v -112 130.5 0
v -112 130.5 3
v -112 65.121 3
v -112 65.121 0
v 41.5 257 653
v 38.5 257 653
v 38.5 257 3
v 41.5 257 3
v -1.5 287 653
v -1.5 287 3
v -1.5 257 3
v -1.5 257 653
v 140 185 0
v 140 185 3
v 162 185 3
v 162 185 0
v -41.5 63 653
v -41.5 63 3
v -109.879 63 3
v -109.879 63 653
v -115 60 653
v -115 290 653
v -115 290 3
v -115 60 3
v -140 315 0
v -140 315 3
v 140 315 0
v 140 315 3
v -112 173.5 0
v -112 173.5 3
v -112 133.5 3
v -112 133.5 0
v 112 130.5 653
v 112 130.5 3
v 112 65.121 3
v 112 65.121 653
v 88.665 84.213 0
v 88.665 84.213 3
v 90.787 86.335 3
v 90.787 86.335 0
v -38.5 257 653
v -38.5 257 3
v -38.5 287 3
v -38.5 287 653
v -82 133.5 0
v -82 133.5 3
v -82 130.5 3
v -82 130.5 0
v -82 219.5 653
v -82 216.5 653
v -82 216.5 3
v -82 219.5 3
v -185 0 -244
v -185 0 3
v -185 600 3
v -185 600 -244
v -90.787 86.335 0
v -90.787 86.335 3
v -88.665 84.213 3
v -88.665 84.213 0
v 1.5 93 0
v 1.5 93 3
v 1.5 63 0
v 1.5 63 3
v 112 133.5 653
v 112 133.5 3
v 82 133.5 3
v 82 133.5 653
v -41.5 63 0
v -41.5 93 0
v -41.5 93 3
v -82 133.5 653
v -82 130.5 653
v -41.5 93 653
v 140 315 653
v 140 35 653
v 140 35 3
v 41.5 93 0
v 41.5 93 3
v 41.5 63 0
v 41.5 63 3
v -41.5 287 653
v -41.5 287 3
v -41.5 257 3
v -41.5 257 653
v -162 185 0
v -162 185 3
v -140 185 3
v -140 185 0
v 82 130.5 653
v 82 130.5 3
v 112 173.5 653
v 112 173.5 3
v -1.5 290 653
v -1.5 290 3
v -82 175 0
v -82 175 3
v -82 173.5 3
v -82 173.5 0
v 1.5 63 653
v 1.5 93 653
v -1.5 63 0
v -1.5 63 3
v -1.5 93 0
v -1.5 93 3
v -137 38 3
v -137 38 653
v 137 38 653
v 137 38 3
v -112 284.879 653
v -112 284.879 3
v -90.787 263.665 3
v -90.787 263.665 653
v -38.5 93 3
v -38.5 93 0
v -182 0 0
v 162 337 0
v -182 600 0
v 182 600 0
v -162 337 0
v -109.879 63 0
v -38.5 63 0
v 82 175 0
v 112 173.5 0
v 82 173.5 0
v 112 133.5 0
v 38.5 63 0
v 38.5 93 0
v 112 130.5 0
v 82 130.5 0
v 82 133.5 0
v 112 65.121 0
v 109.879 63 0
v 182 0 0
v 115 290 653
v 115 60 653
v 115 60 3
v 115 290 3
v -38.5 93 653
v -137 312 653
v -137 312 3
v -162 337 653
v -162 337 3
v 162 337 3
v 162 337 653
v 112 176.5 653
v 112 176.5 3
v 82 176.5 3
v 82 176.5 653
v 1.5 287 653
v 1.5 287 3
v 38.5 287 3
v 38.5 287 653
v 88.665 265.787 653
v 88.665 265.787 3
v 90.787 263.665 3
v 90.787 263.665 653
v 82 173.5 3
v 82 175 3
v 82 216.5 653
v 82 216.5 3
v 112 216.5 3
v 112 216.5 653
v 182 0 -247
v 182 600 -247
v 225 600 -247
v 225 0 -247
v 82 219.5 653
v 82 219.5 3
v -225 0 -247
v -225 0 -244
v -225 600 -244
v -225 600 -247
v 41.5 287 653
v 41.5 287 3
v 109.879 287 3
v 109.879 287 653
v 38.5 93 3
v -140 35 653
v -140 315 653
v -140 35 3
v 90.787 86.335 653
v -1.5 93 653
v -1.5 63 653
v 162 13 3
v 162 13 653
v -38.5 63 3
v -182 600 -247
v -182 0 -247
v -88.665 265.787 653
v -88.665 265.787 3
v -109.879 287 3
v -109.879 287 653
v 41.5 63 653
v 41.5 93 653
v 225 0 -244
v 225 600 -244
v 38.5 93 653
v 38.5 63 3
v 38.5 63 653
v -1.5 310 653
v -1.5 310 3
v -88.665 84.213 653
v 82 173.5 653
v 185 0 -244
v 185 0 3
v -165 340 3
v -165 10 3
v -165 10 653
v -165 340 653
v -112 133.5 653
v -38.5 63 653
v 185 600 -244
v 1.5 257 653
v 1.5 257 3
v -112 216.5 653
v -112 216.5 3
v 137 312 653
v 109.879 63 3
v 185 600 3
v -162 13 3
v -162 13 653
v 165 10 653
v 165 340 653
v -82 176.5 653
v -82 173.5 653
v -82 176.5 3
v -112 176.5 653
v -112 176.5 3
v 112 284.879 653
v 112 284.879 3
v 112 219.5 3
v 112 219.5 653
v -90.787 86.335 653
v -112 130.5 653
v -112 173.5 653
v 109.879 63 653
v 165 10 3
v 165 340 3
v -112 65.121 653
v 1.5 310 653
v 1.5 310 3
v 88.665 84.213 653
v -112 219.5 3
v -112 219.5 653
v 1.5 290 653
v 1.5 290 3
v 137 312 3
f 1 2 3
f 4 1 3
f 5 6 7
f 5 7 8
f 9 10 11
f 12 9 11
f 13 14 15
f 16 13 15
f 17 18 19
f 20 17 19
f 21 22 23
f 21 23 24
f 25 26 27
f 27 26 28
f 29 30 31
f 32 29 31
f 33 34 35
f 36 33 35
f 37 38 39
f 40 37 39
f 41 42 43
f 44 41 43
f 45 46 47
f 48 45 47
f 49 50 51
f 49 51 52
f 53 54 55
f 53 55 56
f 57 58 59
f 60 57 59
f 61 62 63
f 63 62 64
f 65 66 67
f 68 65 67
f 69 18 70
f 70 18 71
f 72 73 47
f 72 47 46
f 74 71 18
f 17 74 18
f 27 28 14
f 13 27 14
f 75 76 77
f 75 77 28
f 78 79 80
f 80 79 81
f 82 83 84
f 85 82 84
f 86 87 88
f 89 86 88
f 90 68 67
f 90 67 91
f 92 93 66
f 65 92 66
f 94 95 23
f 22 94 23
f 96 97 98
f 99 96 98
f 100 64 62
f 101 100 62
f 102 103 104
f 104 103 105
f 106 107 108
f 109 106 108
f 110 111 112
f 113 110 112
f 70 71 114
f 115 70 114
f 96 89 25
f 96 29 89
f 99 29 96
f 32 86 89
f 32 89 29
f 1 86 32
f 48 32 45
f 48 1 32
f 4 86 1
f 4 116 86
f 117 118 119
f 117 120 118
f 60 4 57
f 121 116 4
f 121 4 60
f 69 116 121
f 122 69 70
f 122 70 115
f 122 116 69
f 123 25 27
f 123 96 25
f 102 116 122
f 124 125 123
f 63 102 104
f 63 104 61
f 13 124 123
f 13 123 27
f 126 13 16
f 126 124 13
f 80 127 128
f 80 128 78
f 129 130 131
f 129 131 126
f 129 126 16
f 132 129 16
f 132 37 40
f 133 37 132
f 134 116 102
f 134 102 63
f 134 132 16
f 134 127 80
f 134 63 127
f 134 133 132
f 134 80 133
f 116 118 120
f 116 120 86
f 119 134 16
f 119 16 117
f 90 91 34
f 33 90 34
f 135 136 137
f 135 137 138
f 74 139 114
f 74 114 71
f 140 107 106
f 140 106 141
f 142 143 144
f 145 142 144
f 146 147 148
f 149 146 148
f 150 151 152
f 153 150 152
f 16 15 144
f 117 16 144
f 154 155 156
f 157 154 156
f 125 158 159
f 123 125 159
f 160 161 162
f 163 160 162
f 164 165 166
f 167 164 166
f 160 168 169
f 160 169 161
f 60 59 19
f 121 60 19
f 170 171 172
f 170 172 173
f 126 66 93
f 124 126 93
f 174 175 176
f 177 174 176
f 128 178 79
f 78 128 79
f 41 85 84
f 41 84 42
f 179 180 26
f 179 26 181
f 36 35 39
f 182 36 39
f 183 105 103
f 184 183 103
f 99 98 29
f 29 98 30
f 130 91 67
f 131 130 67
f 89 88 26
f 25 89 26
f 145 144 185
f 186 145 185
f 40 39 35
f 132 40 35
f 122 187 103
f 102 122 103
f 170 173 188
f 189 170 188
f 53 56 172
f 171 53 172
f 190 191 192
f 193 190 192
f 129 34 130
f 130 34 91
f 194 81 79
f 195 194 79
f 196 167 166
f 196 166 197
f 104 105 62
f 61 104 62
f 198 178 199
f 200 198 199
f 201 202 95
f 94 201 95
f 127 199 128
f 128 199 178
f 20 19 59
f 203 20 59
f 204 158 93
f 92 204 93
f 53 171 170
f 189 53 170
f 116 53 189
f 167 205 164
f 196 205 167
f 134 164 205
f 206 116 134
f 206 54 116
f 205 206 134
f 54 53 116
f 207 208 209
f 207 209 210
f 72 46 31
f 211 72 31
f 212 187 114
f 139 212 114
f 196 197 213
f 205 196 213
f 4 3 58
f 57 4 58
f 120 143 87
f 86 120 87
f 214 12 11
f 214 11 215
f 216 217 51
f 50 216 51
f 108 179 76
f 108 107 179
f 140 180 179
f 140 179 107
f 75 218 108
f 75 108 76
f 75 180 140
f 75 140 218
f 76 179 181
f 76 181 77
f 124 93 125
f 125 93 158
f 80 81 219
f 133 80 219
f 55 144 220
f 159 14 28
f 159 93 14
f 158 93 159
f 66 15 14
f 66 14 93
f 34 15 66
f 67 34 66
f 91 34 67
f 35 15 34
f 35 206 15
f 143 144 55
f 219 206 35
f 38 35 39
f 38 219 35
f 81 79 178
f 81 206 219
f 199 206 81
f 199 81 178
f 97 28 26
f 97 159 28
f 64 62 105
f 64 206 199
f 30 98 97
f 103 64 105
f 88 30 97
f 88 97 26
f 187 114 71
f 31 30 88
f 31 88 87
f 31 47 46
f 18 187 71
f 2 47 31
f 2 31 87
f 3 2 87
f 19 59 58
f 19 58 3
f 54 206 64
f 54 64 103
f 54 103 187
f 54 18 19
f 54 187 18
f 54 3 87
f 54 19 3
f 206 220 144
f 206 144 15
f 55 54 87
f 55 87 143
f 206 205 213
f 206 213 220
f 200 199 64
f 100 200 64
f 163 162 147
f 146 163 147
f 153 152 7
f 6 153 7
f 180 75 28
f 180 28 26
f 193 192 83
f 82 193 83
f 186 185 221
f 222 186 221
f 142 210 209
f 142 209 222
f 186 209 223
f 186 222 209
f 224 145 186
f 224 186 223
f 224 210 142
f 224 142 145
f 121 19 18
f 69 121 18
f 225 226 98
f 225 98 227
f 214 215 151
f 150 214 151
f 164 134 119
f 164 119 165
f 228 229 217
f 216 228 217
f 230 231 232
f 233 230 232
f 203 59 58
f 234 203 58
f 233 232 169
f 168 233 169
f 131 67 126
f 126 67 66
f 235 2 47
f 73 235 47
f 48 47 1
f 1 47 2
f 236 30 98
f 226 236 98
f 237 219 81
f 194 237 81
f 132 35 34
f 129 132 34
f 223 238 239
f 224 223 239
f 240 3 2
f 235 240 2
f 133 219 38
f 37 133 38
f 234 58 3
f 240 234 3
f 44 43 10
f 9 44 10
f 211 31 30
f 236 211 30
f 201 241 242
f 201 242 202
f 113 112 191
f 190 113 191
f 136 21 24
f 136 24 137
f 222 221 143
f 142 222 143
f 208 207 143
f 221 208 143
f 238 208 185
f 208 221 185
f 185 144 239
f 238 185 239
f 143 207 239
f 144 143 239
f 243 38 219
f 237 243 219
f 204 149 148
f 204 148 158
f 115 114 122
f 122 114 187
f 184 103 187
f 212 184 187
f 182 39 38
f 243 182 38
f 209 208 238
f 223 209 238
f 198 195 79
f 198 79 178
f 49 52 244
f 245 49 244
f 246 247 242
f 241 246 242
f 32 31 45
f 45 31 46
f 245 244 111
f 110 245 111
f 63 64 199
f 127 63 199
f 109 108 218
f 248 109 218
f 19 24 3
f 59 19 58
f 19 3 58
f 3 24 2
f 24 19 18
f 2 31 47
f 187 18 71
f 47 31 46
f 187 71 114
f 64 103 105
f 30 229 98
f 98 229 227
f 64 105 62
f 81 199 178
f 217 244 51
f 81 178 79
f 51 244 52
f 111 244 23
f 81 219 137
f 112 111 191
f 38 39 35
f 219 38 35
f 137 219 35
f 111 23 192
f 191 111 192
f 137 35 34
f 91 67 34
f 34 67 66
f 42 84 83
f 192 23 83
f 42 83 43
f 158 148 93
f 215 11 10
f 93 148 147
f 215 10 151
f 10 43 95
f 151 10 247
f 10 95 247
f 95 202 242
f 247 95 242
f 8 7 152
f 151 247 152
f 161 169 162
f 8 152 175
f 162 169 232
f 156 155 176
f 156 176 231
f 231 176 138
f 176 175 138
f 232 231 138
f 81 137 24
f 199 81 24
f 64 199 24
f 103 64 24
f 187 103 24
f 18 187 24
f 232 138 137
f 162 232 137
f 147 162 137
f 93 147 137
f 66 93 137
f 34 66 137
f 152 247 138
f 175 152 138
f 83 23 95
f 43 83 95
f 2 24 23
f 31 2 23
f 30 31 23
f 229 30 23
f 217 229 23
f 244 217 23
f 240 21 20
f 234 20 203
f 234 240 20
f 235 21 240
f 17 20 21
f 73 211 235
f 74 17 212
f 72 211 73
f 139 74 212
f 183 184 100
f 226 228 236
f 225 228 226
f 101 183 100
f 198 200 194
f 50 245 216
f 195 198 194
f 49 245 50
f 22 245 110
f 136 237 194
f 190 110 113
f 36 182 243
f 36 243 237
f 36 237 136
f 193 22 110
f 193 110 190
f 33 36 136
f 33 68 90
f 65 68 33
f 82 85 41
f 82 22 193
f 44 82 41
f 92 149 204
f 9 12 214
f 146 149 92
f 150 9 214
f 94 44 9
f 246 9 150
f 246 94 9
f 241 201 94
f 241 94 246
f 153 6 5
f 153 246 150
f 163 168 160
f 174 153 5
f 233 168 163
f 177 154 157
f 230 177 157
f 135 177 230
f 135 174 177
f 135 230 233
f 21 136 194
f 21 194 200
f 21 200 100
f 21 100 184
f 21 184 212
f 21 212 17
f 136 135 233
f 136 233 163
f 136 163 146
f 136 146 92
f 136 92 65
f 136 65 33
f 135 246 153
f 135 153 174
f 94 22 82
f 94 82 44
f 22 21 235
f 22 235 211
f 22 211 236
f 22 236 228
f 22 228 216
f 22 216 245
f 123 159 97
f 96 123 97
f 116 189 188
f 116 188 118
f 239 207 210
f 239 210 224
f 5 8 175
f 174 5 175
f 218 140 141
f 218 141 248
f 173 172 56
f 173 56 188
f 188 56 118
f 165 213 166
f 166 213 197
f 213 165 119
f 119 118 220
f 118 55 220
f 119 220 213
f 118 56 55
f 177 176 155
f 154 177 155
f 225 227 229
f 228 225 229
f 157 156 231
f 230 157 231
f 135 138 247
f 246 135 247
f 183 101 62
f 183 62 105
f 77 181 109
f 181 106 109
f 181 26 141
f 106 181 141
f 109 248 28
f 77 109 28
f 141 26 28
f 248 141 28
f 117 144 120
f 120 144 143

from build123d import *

# Parameters (mm, degrees)
F3_DEPTH = 600
F5_DEPTH = 250.001
F6_DEPTH = 650
F4_W     = 274
F4_H     = 274
F7_DEPTH = 650
F4_W_2   = 330
F4_H_2   = 330
F8_DEPTH = 650


with BuildPart() as f3:
    # F2 (on Front) → F3 (new body)
    with BuildSketch(Plane.XZ):
        Polygon((-182, -247), (-182, 0), (182, 0), (182, -247), (225, -247), (225, -244), (185, -244), (185, 3), (-185, 3), (-185, -244), (-225, -244), (-225, -247), align=None)
    extrude(amount=-F3_DEPTH)

    # F4 (on face) → F5 (cut, through all)
    with BuildSketch(Plane.XY.offset(3)):
        Polygon((140, 315), (140, 185), (162, 185), (162, 337), (-162, 337), (-162, 185), (-140, 185), (-140, 315), align=None)
        Polygon((90.7867965644, 86.3345237792), (112, 65.1213203436), (112, 130.5), (82, 130.5), (82, 133.5), (112, 133.5), (112, 173.5), (82, 173.5), (82, 175), (-82, 175), (-82, 173.5), (-112, 173.5), (-112, 133.5), (-82, 133.5), (-82, 130.5), (-112, 130.5), (-112, 65.1213203436), (-90.7867965644, 86.3345237792), (-88.6654762208, 84.2132034356), (-109.8786796564, 63), (-41.5, 63), (-41.5, 93), (-38.5, 93), (-38.5, 63), (-1.5, 63), (-1.5, 93), (1.5, 93), (1.5, 63), (38.5, 63), (38.5, 93), (41.5, 93), (41.5, 63), (109.8786796564, 63), (88.6654762208, 84.2132034356), align=None)
    extrude(amount=-F5_DEPTH, mode=Mode.SUBTRACT)


with BuildPart() as f6:
    # F4 (on face) → F6 (new body)
    with BuildSketch(Plane.XY.offset(3)):
        Polygon((-115, 60), (115, 60), (115, 290), (1.5, 290), (1.5, 310), (-1.5, 310), (-1.5, 290), (-115, 290), align=None)
        Polygon((112, 130.5), (112, 65.1213203436), (90.7867965644, 86.3345237792), (88.6654762208, 84.2132034356), (109.8786796564, 63), (41.5, 63), (41.5, 93), (38.5, 93), (38.5, 63), (1.5, 63), (1.5, 93), (-1.5, 93), (-1.5, 63), (-38.5, 63), (-38.5, 93), (-41.5, 93), (-41.5, 63), (-109.8786796564, 63), (-88.6654762208, 84.2132034356), (-90.7867965644, 86.3345237792), (-112, 65.1213203436), (-112, 130.5), (-82, 130.5), (-82, 133.5), (-112, 133.5), (-112, 173.5), (-82, 173.5), (-82, 175), (-82, 176.5), (-112, 176.5), (-112, 216.5), (-82, 216.5), (-82, 219.5), (-112, 219.5), (-112, 284.8786796564), (-90.7867965644, 263.6654762208), (-88.6654762208, 265.7867965644), (-109.8786796564, 287), (-41.5, 287), (-41.5, 257), (-38.5, 257), (-38.5, 287), (-1.5, 287), (-1.5, 257), (1.5, 257), (1.5, 287), (38.5, 287), (38.5, 257), (41.5, 257), (41.5, 287), (109.8786796564, 287), (88.6654762208, 265.7867965644), (90.7867965644, 263.6654762208), (112, 284.8786796564), (112, 219.5), (82, 219.5), (82, 216.5), (112, 216.5), (112, 176.5), (82, 176.5), (82, 175), (82, 173.5), (112, 173.5), (112, 133.5), (82, 133.5), (82, 130.5), align=None, mode=Mode.SUBTRACT)
    extrude(amount=F6_DEPTH)


with BuildPart() as f7:
    # F4 (on face) → F7 (new body)
    with BuildSketch(Plane.XY.offset(3)):
        Polygon((-140, 35), (140, 35), (140, 185), (140, 315), (-140, 315), (-140, 185), align=None)
        with Locations((0, 175)):
            Rectangle(F4_W, F4_H, mode=Mode.SUBTRACT)
    extrude(amount=F7_DEPTH)


with BuildPart() as f8:
    # F4 (on face) → F8 (new body)
    with BuildSketch(Plane.XY.offset(3)):
        with Locations((0, 175)):
            Rectangle(F4_W_2, F4_H_2)
        Polygon((162, 337), (162, 185), (162, 13), (-162, 13), (-162, 185), (-162, 337), align=None, mode=Mode.SUBTRACT)
    extrude(amount=F8_DEPTH)


solid = Compound([f3.part, f6.part, f7.part, f8.part])
